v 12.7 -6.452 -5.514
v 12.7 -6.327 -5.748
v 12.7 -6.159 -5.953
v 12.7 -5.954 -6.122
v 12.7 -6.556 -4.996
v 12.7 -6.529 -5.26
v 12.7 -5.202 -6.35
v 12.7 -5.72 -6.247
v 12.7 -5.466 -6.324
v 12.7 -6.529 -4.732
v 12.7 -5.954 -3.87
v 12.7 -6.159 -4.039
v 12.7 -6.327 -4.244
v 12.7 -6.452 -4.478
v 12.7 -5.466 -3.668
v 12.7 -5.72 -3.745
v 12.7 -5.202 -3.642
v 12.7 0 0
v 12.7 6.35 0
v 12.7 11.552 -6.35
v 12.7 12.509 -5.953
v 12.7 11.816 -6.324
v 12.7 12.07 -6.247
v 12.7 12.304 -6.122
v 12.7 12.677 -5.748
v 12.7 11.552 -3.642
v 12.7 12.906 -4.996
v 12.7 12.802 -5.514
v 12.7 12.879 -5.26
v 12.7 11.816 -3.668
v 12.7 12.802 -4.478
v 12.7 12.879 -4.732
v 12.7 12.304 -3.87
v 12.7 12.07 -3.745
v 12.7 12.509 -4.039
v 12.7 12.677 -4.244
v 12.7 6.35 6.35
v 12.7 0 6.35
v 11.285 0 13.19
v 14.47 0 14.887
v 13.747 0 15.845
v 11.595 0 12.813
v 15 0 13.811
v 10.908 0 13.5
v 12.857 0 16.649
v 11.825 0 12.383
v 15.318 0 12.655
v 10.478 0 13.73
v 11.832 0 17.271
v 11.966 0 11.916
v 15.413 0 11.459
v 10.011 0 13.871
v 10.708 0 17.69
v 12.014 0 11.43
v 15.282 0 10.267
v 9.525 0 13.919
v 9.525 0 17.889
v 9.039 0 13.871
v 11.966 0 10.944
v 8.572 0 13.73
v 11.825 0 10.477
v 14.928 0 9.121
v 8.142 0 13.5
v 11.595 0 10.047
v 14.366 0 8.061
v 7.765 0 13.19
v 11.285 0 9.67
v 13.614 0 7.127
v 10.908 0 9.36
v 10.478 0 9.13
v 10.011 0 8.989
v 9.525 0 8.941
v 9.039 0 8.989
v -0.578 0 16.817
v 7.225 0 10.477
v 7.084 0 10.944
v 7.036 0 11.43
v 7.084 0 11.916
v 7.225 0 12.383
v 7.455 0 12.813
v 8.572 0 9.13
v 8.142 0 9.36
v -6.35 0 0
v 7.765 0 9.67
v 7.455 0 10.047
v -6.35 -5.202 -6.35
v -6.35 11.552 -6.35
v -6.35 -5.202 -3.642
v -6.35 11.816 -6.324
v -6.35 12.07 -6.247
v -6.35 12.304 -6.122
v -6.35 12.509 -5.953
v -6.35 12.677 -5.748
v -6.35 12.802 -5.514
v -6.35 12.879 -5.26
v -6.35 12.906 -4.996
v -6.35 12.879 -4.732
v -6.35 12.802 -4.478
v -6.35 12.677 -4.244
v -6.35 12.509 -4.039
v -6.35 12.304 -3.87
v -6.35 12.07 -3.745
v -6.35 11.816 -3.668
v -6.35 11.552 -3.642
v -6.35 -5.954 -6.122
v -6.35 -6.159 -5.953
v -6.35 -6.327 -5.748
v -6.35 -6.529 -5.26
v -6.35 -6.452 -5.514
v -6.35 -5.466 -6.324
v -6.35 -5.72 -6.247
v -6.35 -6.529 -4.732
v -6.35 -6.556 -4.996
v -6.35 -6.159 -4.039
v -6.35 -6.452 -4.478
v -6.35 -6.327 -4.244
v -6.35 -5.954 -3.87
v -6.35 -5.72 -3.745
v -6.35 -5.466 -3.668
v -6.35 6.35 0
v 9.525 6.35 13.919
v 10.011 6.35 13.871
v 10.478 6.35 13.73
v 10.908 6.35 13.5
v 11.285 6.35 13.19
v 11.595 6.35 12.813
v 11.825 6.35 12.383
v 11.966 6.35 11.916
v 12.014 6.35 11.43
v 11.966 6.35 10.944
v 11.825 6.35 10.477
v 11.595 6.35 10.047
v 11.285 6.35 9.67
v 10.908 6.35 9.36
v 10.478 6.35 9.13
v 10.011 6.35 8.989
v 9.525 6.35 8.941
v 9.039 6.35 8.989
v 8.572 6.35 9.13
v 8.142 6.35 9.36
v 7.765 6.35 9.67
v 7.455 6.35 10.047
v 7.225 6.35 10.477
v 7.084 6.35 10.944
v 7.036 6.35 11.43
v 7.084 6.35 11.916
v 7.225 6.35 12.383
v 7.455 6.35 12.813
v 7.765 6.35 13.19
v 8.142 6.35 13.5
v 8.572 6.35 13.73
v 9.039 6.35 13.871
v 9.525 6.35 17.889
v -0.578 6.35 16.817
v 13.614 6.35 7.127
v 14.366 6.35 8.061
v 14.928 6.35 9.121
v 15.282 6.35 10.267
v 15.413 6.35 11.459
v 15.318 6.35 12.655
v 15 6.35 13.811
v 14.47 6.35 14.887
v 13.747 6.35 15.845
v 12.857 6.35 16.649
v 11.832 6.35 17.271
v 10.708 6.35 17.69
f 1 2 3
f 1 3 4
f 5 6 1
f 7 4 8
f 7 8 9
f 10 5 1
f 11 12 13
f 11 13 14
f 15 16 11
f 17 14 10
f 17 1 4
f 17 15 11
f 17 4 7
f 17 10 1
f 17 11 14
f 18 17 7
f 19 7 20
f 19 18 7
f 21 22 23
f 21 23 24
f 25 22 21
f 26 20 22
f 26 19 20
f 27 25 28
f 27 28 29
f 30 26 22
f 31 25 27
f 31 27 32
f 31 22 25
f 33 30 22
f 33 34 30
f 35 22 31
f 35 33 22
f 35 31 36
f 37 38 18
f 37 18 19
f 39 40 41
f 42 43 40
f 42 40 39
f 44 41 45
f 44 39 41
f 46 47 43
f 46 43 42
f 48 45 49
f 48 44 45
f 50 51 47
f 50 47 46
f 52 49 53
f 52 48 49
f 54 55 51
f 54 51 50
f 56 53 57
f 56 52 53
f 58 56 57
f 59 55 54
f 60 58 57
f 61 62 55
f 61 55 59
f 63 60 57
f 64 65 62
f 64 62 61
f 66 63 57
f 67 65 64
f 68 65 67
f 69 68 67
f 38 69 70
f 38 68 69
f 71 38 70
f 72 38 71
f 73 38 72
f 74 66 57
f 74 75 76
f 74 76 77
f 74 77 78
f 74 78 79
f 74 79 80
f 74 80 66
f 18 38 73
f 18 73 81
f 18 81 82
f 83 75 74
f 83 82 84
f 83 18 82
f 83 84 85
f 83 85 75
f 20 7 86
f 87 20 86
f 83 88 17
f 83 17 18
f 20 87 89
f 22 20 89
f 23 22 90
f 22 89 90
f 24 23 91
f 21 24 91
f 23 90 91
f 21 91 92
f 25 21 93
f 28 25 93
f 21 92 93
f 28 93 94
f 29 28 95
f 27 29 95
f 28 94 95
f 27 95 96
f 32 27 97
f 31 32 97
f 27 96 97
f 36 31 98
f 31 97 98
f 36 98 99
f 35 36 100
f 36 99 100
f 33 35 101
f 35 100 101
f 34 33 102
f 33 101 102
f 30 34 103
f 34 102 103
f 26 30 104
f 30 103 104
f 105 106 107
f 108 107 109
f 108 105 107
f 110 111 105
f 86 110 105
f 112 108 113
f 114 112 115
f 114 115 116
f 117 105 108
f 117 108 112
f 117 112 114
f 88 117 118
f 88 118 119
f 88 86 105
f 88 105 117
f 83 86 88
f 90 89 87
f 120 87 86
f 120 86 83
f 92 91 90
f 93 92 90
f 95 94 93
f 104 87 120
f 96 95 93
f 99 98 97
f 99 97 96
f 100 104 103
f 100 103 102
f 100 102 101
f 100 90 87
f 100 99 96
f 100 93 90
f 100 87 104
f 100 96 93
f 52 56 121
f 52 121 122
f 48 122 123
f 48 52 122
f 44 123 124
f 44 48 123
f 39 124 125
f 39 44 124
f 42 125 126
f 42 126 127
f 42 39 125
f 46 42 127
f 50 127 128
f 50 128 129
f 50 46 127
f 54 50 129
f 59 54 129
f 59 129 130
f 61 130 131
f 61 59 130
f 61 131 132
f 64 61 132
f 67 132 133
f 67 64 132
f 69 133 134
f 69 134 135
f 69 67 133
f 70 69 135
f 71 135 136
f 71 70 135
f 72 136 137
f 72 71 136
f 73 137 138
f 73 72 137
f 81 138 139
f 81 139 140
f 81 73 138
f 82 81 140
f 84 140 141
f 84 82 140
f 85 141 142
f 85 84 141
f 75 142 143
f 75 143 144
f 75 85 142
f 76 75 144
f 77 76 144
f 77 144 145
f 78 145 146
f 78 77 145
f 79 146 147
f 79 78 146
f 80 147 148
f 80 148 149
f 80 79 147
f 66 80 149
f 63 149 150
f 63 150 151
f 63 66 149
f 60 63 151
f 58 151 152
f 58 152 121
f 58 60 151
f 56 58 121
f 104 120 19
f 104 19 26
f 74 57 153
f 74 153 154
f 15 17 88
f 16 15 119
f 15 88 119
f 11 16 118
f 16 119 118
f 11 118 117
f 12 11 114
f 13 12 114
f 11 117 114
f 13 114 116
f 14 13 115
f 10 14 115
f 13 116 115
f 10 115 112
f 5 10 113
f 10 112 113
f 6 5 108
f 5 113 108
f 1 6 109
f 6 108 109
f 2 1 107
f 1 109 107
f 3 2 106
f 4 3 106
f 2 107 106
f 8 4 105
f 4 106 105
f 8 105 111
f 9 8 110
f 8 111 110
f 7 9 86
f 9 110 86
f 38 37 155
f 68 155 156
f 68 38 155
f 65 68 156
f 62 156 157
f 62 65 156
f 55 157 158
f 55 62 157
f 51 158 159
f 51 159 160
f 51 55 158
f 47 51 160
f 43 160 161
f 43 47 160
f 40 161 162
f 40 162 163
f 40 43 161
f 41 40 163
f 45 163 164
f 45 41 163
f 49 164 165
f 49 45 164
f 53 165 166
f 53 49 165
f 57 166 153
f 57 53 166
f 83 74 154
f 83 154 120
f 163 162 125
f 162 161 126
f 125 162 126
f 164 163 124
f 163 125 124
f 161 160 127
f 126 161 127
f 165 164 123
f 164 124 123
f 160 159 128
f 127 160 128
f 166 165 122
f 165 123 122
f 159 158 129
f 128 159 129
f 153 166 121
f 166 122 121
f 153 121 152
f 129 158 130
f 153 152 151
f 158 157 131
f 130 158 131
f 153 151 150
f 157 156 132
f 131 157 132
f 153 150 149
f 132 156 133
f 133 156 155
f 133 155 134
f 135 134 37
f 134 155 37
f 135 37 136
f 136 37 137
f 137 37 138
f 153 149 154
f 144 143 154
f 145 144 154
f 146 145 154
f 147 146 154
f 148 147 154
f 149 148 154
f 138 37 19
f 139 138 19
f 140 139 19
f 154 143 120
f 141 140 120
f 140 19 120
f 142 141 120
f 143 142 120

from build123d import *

# Parameters (mm, degrees)
SKETCH1_R               = 2.4892
BOSS_EXTRUDE1_DEPTH     = 6.35
BOSS_EXTRUDE2_START     = -6.35
BOSS_EXTRUDE2_DEPTH     = 19.05
BOSS_EXTRUDE2_START_2   = -6.555460136
BOSS_EXTRUDE2_2_DEPTH   = 19.460920272
BOSS_EXTRUDE2_START_3   = -10
BOSS_EXTRUDE2_3_DEPTH   = 3.65
CUT_EXTRUDE1_DEPTH      = 27.910448217
CUT_EXTRUDE1_DEPTH_BACK = 27.910448217
SKETCH3_W               = 2.179354936
SKETCH3_H               = 6.35


with BuildPart() as part:
    # Sketch1 → Boss-Extrude1 (new body)
    with BuildSketch(Plane(origin=(0, 0, 0), x_dir=(1, 0, 0), z_dir=(0, 1, 0))):
        with BuildLine():
            Line((9.525, -17.889269346), (-0.578271622, -16.817120786))
            Line((-0.578271622, -16.817120786), (-6.35, 0))
            Line((-6.35, 0), (12.7, 0))
            Line((12.7, 0), (12.7, -6.35))
            ThreePointArc((12.7, -6.35), (15.186560179, -13.240601753), (9.525, -17.889269346))
        make_face()
        with Locations(Location((9.525, -11.43, 0), (0, 0, 270))):
            Circle(SKETCH1_R, mode=Mode.SUBTRACT)
    extrude(amount=BOSS_EXTRUDE1_DEPTH)

    # Boss-Extrude2: read off the stored shape, not the designer's step
    # Boss-Extrude2 outline → Boss-Extrude2 (add)
    with BuildSketch(Plane.YZ.offset(BOSS_EXTRUDE2_START)):
        with BuildLine():
            ThreePointArc((11.551615481, -6.35), (12.905510296, -4.996105185), (11.551615481, -3.642210371))
            Line((11.551615481, -3.642210371), (6.35, 0))
            Line((6.35, 0), (0, 0))
            Line((0, 0), (-5.201615481, -3.642210371))
            ThreePointArc((-5.201615481, -3.642210371), (-6.555510296, -4.996105185), (-5.201615481, -6.35))
            Line((-5.201615481, -6.35), (11.551615481, -6.35))
        make_face()
    extrude(amount=BOSS_EXTRUDE2_DEPTH)

    # Boss-Extrude2 2 outline → Boss-Extrude2 2 (add)
    with BuildSketch(Plane(origin=(0, 0, 0), x_dir=(1, 0, 0), z_dir=(0, 1, 0)).offset(BOSS_EXTRUDE2_START_2)):
        Polygon((-8.529354936, 6.35), (-6.35, 0), (-6.35, 6.35), align=None)
    extrude(amount=BOSS_EXTRUDE2_2_DEPTH)

    # Boss-Extrude2 3 outline → Boss-Extrude2 3 (cut)
    with BuildSketch(Plane.YZ.offset(BOSS_EXTRUDE2_START_3)):
        with BuildLine():
            Line((12.905460136, 0), (6.35, 0))
            Line((6.35, 0), (11.551615481, -3.642210371))
            ThreePointArc((11.551615481, -3.642210371), (12.504834401, -4.034645431), (12.905460136, -4.984450993))
            Line((12.905460136, -4.984450993), (12.905460136, 0))
        make_face()
        with BuildLine():
            ThreePointArc((12.905460136, -5.007759378), (12.504834401, -5.95756494), (11.551615481, -6.35))
            Line((11.551615481, -6.35), (12.905460136, -6.35))
            Line((12.905460136, -6.35), (12.905460136, -5.007759378))
        make_face()
        with BuildLine():
            Line((0, 0), (-6.555460136, 0))
            Line((-6.555460136, 0), (-6.555460136, -4.984450993))
            ThreePointArc((-6.555460136, -4.984450993), (-6.154834401, -4.034645431), (-5.201615481, -3.642210371))
            Line((-5.201615481, -3.642210371), (0, 0))
        make_face()
        with BuildLine():
            ThreePointArc((-5.201615481, -6.35), (-6.154834401, -5.95756494), (-6.555460136, -5.007759378))
            Line((-6.555460136, -5.007759378), (-6.555460136, -6.35))
            Line((-6.555460136, -6.35), (-5.201615481, -6.35))
        make_face()
    extrude(amount=BOSS_EXTRUDE2_3_DEPTH, mode=Mode.SUBTRACT)

    # Sketch3 → Cut-Extrude1 (cut, two sides: drawn at the far end of the back side and taken through both)
    with BuildSketch(Plane.XZ.offset(-CUT_EXTRUDE1_DEPTH_BACK)):
        with Locations((-7.439677468, -3.175)):
            Rectangle(SKETCH3_W, SKETCH3_H)
    extrude(amount=CUT_EXTRUDE1_DEPTH + CUT_EXTRUDE1_DEPTH_BACK, mode=Mode.SUBTRACT)


solid = part.part
